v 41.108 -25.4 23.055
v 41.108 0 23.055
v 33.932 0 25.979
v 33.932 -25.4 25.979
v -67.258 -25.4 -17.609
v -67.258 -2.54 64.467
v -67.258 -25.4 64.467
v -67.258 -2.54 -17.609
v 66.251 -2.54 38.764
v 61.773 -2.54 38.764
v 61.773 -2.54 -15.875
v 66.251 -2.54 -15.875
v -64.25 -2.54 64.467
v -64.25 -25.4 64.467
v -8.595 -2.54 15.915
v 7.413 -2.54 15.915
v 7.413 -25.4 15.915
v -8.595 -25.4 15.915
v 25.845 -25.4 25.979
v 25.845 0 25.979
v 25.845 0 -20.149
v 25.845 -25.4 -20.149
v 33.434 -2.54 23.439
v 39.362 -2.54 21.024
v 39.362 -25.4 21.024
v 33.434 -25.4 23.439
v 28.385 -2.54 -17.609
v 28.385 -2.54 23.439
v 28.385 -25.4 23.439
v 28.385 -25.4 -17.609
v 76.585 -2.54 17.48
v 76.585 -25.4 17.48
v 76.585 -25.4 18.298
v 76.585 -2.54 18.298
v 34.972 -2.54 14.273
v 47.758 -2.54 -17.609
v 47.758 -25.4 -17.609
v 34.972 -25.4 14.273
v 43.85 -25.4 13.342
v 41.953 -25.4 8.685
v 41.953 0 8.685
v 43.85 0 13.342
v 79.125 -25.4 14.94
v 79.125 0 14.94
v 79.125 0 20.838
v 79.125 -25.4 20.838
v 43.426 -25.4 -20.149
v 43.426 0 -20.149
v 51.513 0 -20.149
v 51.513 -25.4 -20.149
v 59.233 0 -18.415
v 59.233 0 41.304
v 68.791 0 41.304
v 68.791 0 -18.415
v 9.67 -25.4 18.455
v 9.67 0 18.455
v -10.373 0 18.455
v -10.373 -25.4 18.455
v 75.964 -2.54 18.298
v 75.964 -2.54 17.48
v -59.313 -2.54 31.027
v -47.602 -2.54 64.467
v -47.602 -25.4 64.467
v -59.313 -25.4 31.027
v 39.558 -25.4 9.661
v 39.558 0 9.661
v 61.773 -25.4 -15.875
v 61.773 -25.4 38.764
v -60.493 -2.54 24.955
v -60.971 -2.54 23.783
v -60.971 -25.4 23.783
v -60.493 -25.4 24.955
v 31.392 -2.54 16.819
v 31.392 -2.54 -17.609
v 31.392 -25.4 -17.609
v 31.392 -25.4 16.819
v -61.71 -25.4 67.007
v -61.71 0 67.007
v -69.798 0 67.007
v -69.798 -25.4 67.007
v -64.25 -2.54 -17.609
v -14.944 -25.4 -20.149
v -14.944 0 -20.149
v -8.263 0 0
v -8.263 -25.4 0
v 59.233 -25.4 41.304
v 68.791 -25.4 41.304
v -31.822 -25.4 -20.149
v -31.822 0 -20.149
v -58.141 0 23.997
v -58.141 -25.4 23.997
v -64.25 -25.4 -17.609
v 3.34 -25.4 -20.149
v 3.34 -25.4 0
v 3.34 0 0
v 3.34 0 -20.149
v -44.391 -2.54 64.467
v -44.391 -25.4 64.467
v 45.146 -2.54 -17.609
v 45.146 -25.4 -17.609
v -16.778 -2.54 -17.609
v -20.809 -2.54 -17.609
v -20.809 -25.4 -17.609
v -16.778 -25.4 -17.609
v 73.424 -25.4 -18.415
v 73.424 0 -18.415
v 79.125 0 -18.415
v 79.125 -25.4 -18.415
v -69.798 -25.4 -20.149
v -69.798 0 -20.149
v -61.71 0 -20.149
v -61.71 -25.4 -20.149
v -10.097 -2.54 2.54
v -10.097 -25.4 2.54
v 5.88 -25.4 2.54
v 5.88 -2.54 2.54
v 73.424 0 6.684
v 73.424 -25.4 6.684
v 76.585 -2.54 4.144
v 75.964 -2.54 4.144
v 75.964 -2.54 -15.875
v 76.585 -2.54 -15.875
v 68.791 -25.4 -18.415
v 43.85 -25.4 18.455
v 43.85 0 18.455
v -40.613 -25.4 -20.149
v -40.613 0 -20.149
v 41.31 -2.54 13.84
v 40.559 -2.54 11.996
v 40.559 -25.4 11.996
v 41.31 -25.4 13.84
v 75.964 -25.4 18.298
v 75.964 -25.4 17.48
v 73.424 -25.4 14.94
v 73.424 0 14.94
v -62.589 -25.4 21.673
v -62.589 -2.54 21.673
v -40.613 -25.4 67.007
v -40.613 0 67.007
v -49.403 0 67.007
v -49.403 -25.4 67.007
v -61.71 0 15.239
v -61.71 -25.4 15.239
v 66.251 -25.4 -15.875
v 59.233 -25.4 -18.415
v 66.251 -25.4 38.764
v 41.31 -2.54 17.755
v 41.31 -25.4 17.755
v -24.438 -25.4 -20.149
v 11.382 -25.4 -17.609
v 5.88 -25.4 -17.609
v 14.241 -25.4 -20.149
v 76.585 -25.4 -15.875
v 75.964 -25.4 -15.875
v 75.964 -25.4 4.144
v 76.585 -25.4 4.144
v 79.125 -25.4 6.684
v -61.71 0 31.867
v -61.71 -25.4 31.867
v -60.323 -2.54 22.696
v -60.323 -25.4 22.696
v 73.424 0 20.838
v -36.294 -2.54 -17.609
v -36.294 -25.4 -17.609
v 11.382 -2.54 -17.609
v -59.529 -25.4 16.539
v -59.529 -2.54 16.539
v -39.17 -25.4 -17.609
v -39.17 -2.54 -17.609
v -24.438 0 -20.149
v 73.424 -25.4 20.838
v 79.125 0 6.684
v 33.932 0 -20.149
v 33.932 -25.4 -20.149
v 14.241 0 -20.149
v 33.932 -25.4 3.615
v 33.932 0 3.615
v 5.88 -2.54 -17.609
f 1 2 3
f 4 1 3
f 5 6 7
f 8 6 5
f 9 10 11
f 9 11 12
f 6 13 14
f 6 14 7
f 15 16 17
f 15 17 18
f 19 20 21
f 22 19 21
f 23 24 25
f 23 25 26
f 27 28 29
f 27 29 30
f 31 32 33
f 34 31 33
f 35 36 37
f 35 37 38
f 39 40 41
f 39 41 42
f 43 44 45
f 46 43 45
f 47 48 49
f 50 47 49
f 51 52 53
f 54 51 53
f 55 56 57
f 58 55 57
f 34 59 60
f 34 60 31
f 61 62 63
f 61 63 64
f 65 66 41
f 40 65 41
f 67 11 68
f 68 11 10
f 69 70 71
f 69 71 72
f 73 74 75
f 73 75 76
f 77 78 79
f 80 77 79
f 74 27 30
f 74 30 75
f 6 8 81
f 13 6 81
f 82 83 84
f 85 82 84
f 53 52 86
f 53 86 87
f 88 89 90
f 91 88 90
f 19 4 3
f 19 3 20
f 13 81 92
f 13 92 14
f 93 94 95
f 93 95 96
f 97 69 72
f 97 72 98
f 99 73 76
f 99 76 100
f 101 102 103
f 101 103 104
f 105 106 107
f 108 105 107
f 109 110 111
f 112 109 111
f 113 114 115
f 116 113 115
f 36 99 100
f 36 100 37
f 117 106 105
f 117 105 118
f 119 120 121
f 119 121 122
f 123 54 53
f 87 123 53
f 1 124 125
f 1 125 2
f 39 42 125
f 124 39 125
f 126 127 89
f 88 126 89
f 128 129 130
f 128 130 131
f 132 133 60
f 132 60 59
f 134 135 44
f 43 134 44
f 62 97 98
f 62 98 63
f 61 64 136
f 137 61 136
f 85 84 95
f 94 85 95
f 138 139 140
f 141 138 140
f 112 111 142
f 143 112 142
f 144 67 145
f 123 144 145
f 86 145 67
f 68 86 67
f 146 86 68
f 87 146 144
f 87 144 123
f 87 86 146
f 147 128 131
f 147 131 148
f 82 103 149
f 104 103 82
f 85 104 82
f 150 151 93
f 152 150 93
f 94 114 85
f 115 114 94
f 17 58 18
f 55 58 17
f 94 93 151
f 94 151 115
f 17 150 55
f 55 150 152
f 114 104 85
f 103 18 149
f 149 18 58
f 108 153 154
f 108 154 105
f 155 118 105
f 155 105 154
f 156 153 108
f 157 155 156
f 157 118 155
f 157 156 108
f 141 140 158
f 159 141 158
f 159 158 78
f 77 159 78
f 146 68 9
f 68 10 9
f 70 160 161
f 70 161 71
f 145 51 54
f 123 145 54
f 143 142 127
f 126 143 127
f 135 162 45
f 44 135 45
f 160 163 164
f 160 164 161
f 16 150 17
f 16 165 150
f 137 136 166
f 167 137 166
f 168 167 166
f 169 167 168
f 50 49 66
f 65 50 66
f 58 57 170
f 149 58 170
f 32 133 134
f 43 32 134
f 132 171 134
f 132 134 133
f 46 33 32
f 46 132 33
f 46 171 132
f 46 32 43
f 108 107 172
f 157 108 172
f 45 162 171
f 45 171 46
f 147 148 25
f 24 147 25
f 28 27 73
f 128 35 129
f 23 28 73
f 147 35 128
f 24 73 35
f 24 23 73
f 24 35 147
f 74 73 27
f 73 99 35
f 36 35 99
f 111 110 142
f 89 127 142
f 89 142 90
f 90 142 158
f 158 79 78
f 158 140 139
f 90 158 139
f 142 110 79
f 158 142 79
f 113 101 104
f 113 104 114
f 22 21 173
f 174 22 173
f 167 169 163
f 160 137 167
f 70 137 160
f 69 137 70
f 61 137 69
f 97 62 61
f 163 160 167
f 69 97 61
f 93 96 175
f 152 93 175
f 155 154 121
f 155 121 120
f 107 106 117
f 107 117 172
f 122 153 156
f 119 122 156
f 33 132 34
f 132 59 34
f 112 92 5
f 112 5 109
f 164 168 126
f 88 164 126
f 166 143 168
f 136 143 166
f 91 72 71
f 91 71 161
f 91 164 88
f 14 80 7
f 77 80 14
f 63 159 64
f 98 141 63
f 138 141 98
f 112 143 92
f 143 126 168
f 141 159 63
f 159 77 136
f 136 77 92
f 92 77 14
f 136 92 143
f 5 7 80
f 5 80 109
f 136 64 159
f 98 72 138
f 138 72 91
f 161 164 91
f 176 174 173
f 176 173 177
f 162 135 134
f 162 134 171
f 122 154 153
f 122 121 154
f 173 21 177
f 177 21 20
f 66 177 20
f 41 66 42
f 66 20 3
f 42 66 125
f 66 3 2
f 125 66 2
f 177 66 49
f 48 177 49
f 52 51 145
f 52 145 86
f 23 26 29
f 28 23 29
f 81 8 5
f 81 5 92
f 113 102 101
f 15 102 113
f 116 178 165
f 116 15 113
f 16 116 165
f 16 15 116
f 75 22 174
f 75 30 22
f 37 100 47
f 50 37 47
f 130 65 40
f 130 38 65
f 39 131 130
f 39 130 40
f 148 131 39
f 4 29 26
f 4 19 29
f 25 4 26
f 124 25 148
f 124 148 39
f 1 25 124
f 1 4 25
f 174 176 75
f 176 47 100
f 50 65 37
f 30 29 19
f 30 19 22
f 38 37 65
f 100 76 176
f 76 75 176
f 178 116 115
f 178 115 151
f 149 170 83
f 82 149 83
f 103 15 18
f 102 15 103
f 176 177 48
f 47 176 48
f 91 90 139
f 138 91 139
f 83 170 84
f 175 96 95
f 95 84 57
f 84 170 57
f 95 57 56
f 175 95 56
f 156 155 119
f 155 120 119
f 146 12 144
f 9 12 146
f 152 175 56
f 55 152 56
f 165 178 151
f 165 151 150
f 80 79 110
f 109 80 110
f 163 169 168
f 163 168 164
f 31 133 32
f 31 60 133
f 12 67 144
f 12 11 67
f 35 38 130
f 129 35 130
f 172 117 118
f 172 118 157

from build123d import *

# Parameters (mm, degrees)
F1_DEPTH    = 25.4
F0_W        = 9.557787329
F0_H        = 59.7195103765
F0_W_2      = 5.7009607553
F0_H_2      = 25.0989235938
F0_H_3      = 5.8975424618
F2_T        = -2.54
F3_T        = -2.54
F4_T        = -2.54
F5_T        = 2.54
F5_T3_DEPTH = 30.48
F6_T        = -2.54
F6_2_T      = -2.54


# Not quite as in the source:
# - a shell that OpenCascade refuses in one call is made with other operations: the cavity is built on its own and cut out


with BuildPart() as f1:
    # F0 (on Front) → F1 (new body)
    with BuildSketch(Plane.XZ):
        Polygon((-69.7978138924, 67.0073106885), (-69.7978138924, -20.1488938183), (-61.7104172707, -20.1488938183), (-61.7104172707, 15.2386100963), (-61.7104172707, 31.8665504456), (-61.7104172707, 67.0073106885), align=None)
        Polygon((-61.7104172707, 31.8665504456), (-61.7104172707, 15.2386100963), (-58.1411987634, 23.9966676942), (-40.6128391623, 67.0073106885), (-49.4034960866, 67.0073106885), align=None)
        Polygon((-58.1411987634, 23.9966676942), (-61.7104172707, 15.2386100963), (-40.6128391623, -20.1488938183), (-31.8221785128, -20.1488938183), align=None)
    extrude(amount=F1_DEPTH)

    # F5: shell of thickness 2.54, made by hand


with BuildPart() as f1b:
    # F0 (on Front) → F1, piece 2 (new body)
    with BuildSketch(Plane.XZ):
        Polygon((9.6697267145, 18.4547863901), (-10.3729721159, 18.4547863901), (-24.4380254298, -20.1488938183), (-14.944116585, -20.1488938183), (-8.2632154226, 0), (3.3404529095, 0), (3.3404529095, -20.1488938183), (14.2408590764, -20.1488938183), align=None)
    extrude(amount=F1_DEPTH)

    # F2
    f2_openings = [f1b.faces().sort_by_distance(p)[0] for p in [
        (-0.351623, -25.4, 17.908316),
    ]]
    offset(amount=F2_T, openings=f2_openings, kind=Kind.INTERSECTION)


with BuildPart() as f1c:
    # F0 (on Front) → F1, piece 3 (new body)
    with BuildSketch(Plane.XZ):
        Polygon((25.8445329964, 25.9793000181), (25.8445329964, 18.4547863901), (25.8445329964, 6.7574218847), (25.8445329964, -20.1488938183), (33.931940794, -20.1488938183), (33.931940794, 3.6146529019), (43.4258431196, -20.1488938183), (51.5132546425, -20.1488938183), (39.5579561591, 9.6612665802), (41.9525803864, 8.6853724377), (43.8503899663, 13.3421693182), (43.8503899663, 18.4547863901), (41.1078936159, 23.0548452138), (33.931940794, 25.9793000181), align=None)
    extrude(amount=F1_DEPTH)

    # F4
    f4_openings = [f1c.faces().sort_by_distance(p)[0] for p in [
        (35.185702, -25.4, 2.749804),
    ]]
    offset(amount=F4_T, openings=f4_openings, kind=Kind.INTERSECTION)


with BuildPart() as f1d:
    # F0 (on Front) → F1, piece 4 (new body)
    with BuildSketch(Plane.XZ):
        with Locations((64.0123244375, 11.4447139204)):
            Rectangle(F0_W, F0_H)
    extrude(amount=F1_DEPTH)

    # F3
    f3_openings = [f1d.faces().sort_by_distance(p)[0] for p in [
        (64.012324, -25.4, 11.444714),
    ]]
    offset(amount=F3_T, openings=f3_openings)


with BuildPart() as f1e:
    # F0 (on Front) → F1, piece 5 (new body)
    with BuildSketch(Plane.XZ):
        with Locations((76.2748867273, -5.865579471)):
            Rectangle(F0_W_2, F0_H_2)
    extrude(amount=F1_DEPTH)

    # F6
    f6_openings = [f1e.faces().sort_by_distance(p)[0] for p in [
        (76.274887, -25.4, -5.865579),
    ]]
    offset(amount=F6_T, openings=f6_openings)


with BuildPart() as f1f:
    # F0 (on Front) → F1, piece 6 (new body)
    with BuildSketch(Plane.XZ):
        with Locations((76.2748867273, 17.8892137483)):
            Rectangle(F0_W_2, F0_H_3)
    extrude(amount=F1_DEPTH)

    # F6#2
    f6_2_openings = [f1f.faces().sort_by_distance(p)[0] for p in [
        (76.274887, -25.4, 17.889214),
    ]]
    offset(amount=F6_2_T, openings=f6_2_openings)


with BuildPart() as f5_core1:
    # F5_t2: copy of F1
    add(f1.part)

    # the walls: a layer under each face that stays
    f5_faces = [f5_core1.faces().sort_by_distance(p)[0] for p in [
        (-69.7978138924, -12.7, 23.4292084351),
        (-65.7541155815, -12.7, -20.1488938183),
        (-61.7104172707, -12.7, -2.455141861),
        (-51.1616282165, -12.7, -2.455141861),
        (-36.2175088376, -12.7, -20.1488938183),
        (-44.9816886381, -12.7, 1.923886938),
        (-49.3770189629, -12.7, 45.5019891914),
        (-45.0081676245, -12.7, 67.0073106885),
        (-55.5569566786, -12.7, 49.436930567),
        (-61.7104172707, -12.7, 49.436930567),
        (-65.7541155815, -12.7, 67.0073106885),
        (-63.4685413291, 0, -5.6228597338),
    ]]
    thicken(f5_faces, amount=-F5_T, mode=Mode.SUBTRACT)

    # F5_s4 → F5_t3 (cut)
    with BuildSketch(Plane.XZ.offset(-2.54)):
        Polygon((-61.7068342034, 15.2256031195), (-64.2504172707, 15.2386100963), (-64.2504172707, 24.4591238986), (-59.5287239963, 16.5393077769), align=None)
        Polygon((-58.0958601368, 24.0000887481), (-60.3228920378, 22.6959700136), (-60.9710486864, 23.7831396319), (-60.493368149, 24.9552599859), align=None)
        Polygon((-61.7089896442, 31.8749459985), (-59.3131799199, 31.0269951562), (-64.2504172707, 16.9293771238), (-64.2504172707, 31.8665504456), align=None)
    extrude(amount=F5_T3_DEPTH, mode=Mode.SUBTRACT)


with BuildPart() as f1_1:
    add(f1.part)

    # what is left inside the walls is the cavity
    f5_cavity = [f5_core1.part.solids().sort_by_distance(p)[0] for p in [
        (-67.232414, -17.78, 23.429208),
        (-48.330086, -17.78, 2.530531),
    ]]
    add(f5_cavity, mode=Mode.SUBTRACT)


solid = Compound([f1b.part, f1c.part, f1d.part, f1e.part, f1f.part, f1_1.part])
